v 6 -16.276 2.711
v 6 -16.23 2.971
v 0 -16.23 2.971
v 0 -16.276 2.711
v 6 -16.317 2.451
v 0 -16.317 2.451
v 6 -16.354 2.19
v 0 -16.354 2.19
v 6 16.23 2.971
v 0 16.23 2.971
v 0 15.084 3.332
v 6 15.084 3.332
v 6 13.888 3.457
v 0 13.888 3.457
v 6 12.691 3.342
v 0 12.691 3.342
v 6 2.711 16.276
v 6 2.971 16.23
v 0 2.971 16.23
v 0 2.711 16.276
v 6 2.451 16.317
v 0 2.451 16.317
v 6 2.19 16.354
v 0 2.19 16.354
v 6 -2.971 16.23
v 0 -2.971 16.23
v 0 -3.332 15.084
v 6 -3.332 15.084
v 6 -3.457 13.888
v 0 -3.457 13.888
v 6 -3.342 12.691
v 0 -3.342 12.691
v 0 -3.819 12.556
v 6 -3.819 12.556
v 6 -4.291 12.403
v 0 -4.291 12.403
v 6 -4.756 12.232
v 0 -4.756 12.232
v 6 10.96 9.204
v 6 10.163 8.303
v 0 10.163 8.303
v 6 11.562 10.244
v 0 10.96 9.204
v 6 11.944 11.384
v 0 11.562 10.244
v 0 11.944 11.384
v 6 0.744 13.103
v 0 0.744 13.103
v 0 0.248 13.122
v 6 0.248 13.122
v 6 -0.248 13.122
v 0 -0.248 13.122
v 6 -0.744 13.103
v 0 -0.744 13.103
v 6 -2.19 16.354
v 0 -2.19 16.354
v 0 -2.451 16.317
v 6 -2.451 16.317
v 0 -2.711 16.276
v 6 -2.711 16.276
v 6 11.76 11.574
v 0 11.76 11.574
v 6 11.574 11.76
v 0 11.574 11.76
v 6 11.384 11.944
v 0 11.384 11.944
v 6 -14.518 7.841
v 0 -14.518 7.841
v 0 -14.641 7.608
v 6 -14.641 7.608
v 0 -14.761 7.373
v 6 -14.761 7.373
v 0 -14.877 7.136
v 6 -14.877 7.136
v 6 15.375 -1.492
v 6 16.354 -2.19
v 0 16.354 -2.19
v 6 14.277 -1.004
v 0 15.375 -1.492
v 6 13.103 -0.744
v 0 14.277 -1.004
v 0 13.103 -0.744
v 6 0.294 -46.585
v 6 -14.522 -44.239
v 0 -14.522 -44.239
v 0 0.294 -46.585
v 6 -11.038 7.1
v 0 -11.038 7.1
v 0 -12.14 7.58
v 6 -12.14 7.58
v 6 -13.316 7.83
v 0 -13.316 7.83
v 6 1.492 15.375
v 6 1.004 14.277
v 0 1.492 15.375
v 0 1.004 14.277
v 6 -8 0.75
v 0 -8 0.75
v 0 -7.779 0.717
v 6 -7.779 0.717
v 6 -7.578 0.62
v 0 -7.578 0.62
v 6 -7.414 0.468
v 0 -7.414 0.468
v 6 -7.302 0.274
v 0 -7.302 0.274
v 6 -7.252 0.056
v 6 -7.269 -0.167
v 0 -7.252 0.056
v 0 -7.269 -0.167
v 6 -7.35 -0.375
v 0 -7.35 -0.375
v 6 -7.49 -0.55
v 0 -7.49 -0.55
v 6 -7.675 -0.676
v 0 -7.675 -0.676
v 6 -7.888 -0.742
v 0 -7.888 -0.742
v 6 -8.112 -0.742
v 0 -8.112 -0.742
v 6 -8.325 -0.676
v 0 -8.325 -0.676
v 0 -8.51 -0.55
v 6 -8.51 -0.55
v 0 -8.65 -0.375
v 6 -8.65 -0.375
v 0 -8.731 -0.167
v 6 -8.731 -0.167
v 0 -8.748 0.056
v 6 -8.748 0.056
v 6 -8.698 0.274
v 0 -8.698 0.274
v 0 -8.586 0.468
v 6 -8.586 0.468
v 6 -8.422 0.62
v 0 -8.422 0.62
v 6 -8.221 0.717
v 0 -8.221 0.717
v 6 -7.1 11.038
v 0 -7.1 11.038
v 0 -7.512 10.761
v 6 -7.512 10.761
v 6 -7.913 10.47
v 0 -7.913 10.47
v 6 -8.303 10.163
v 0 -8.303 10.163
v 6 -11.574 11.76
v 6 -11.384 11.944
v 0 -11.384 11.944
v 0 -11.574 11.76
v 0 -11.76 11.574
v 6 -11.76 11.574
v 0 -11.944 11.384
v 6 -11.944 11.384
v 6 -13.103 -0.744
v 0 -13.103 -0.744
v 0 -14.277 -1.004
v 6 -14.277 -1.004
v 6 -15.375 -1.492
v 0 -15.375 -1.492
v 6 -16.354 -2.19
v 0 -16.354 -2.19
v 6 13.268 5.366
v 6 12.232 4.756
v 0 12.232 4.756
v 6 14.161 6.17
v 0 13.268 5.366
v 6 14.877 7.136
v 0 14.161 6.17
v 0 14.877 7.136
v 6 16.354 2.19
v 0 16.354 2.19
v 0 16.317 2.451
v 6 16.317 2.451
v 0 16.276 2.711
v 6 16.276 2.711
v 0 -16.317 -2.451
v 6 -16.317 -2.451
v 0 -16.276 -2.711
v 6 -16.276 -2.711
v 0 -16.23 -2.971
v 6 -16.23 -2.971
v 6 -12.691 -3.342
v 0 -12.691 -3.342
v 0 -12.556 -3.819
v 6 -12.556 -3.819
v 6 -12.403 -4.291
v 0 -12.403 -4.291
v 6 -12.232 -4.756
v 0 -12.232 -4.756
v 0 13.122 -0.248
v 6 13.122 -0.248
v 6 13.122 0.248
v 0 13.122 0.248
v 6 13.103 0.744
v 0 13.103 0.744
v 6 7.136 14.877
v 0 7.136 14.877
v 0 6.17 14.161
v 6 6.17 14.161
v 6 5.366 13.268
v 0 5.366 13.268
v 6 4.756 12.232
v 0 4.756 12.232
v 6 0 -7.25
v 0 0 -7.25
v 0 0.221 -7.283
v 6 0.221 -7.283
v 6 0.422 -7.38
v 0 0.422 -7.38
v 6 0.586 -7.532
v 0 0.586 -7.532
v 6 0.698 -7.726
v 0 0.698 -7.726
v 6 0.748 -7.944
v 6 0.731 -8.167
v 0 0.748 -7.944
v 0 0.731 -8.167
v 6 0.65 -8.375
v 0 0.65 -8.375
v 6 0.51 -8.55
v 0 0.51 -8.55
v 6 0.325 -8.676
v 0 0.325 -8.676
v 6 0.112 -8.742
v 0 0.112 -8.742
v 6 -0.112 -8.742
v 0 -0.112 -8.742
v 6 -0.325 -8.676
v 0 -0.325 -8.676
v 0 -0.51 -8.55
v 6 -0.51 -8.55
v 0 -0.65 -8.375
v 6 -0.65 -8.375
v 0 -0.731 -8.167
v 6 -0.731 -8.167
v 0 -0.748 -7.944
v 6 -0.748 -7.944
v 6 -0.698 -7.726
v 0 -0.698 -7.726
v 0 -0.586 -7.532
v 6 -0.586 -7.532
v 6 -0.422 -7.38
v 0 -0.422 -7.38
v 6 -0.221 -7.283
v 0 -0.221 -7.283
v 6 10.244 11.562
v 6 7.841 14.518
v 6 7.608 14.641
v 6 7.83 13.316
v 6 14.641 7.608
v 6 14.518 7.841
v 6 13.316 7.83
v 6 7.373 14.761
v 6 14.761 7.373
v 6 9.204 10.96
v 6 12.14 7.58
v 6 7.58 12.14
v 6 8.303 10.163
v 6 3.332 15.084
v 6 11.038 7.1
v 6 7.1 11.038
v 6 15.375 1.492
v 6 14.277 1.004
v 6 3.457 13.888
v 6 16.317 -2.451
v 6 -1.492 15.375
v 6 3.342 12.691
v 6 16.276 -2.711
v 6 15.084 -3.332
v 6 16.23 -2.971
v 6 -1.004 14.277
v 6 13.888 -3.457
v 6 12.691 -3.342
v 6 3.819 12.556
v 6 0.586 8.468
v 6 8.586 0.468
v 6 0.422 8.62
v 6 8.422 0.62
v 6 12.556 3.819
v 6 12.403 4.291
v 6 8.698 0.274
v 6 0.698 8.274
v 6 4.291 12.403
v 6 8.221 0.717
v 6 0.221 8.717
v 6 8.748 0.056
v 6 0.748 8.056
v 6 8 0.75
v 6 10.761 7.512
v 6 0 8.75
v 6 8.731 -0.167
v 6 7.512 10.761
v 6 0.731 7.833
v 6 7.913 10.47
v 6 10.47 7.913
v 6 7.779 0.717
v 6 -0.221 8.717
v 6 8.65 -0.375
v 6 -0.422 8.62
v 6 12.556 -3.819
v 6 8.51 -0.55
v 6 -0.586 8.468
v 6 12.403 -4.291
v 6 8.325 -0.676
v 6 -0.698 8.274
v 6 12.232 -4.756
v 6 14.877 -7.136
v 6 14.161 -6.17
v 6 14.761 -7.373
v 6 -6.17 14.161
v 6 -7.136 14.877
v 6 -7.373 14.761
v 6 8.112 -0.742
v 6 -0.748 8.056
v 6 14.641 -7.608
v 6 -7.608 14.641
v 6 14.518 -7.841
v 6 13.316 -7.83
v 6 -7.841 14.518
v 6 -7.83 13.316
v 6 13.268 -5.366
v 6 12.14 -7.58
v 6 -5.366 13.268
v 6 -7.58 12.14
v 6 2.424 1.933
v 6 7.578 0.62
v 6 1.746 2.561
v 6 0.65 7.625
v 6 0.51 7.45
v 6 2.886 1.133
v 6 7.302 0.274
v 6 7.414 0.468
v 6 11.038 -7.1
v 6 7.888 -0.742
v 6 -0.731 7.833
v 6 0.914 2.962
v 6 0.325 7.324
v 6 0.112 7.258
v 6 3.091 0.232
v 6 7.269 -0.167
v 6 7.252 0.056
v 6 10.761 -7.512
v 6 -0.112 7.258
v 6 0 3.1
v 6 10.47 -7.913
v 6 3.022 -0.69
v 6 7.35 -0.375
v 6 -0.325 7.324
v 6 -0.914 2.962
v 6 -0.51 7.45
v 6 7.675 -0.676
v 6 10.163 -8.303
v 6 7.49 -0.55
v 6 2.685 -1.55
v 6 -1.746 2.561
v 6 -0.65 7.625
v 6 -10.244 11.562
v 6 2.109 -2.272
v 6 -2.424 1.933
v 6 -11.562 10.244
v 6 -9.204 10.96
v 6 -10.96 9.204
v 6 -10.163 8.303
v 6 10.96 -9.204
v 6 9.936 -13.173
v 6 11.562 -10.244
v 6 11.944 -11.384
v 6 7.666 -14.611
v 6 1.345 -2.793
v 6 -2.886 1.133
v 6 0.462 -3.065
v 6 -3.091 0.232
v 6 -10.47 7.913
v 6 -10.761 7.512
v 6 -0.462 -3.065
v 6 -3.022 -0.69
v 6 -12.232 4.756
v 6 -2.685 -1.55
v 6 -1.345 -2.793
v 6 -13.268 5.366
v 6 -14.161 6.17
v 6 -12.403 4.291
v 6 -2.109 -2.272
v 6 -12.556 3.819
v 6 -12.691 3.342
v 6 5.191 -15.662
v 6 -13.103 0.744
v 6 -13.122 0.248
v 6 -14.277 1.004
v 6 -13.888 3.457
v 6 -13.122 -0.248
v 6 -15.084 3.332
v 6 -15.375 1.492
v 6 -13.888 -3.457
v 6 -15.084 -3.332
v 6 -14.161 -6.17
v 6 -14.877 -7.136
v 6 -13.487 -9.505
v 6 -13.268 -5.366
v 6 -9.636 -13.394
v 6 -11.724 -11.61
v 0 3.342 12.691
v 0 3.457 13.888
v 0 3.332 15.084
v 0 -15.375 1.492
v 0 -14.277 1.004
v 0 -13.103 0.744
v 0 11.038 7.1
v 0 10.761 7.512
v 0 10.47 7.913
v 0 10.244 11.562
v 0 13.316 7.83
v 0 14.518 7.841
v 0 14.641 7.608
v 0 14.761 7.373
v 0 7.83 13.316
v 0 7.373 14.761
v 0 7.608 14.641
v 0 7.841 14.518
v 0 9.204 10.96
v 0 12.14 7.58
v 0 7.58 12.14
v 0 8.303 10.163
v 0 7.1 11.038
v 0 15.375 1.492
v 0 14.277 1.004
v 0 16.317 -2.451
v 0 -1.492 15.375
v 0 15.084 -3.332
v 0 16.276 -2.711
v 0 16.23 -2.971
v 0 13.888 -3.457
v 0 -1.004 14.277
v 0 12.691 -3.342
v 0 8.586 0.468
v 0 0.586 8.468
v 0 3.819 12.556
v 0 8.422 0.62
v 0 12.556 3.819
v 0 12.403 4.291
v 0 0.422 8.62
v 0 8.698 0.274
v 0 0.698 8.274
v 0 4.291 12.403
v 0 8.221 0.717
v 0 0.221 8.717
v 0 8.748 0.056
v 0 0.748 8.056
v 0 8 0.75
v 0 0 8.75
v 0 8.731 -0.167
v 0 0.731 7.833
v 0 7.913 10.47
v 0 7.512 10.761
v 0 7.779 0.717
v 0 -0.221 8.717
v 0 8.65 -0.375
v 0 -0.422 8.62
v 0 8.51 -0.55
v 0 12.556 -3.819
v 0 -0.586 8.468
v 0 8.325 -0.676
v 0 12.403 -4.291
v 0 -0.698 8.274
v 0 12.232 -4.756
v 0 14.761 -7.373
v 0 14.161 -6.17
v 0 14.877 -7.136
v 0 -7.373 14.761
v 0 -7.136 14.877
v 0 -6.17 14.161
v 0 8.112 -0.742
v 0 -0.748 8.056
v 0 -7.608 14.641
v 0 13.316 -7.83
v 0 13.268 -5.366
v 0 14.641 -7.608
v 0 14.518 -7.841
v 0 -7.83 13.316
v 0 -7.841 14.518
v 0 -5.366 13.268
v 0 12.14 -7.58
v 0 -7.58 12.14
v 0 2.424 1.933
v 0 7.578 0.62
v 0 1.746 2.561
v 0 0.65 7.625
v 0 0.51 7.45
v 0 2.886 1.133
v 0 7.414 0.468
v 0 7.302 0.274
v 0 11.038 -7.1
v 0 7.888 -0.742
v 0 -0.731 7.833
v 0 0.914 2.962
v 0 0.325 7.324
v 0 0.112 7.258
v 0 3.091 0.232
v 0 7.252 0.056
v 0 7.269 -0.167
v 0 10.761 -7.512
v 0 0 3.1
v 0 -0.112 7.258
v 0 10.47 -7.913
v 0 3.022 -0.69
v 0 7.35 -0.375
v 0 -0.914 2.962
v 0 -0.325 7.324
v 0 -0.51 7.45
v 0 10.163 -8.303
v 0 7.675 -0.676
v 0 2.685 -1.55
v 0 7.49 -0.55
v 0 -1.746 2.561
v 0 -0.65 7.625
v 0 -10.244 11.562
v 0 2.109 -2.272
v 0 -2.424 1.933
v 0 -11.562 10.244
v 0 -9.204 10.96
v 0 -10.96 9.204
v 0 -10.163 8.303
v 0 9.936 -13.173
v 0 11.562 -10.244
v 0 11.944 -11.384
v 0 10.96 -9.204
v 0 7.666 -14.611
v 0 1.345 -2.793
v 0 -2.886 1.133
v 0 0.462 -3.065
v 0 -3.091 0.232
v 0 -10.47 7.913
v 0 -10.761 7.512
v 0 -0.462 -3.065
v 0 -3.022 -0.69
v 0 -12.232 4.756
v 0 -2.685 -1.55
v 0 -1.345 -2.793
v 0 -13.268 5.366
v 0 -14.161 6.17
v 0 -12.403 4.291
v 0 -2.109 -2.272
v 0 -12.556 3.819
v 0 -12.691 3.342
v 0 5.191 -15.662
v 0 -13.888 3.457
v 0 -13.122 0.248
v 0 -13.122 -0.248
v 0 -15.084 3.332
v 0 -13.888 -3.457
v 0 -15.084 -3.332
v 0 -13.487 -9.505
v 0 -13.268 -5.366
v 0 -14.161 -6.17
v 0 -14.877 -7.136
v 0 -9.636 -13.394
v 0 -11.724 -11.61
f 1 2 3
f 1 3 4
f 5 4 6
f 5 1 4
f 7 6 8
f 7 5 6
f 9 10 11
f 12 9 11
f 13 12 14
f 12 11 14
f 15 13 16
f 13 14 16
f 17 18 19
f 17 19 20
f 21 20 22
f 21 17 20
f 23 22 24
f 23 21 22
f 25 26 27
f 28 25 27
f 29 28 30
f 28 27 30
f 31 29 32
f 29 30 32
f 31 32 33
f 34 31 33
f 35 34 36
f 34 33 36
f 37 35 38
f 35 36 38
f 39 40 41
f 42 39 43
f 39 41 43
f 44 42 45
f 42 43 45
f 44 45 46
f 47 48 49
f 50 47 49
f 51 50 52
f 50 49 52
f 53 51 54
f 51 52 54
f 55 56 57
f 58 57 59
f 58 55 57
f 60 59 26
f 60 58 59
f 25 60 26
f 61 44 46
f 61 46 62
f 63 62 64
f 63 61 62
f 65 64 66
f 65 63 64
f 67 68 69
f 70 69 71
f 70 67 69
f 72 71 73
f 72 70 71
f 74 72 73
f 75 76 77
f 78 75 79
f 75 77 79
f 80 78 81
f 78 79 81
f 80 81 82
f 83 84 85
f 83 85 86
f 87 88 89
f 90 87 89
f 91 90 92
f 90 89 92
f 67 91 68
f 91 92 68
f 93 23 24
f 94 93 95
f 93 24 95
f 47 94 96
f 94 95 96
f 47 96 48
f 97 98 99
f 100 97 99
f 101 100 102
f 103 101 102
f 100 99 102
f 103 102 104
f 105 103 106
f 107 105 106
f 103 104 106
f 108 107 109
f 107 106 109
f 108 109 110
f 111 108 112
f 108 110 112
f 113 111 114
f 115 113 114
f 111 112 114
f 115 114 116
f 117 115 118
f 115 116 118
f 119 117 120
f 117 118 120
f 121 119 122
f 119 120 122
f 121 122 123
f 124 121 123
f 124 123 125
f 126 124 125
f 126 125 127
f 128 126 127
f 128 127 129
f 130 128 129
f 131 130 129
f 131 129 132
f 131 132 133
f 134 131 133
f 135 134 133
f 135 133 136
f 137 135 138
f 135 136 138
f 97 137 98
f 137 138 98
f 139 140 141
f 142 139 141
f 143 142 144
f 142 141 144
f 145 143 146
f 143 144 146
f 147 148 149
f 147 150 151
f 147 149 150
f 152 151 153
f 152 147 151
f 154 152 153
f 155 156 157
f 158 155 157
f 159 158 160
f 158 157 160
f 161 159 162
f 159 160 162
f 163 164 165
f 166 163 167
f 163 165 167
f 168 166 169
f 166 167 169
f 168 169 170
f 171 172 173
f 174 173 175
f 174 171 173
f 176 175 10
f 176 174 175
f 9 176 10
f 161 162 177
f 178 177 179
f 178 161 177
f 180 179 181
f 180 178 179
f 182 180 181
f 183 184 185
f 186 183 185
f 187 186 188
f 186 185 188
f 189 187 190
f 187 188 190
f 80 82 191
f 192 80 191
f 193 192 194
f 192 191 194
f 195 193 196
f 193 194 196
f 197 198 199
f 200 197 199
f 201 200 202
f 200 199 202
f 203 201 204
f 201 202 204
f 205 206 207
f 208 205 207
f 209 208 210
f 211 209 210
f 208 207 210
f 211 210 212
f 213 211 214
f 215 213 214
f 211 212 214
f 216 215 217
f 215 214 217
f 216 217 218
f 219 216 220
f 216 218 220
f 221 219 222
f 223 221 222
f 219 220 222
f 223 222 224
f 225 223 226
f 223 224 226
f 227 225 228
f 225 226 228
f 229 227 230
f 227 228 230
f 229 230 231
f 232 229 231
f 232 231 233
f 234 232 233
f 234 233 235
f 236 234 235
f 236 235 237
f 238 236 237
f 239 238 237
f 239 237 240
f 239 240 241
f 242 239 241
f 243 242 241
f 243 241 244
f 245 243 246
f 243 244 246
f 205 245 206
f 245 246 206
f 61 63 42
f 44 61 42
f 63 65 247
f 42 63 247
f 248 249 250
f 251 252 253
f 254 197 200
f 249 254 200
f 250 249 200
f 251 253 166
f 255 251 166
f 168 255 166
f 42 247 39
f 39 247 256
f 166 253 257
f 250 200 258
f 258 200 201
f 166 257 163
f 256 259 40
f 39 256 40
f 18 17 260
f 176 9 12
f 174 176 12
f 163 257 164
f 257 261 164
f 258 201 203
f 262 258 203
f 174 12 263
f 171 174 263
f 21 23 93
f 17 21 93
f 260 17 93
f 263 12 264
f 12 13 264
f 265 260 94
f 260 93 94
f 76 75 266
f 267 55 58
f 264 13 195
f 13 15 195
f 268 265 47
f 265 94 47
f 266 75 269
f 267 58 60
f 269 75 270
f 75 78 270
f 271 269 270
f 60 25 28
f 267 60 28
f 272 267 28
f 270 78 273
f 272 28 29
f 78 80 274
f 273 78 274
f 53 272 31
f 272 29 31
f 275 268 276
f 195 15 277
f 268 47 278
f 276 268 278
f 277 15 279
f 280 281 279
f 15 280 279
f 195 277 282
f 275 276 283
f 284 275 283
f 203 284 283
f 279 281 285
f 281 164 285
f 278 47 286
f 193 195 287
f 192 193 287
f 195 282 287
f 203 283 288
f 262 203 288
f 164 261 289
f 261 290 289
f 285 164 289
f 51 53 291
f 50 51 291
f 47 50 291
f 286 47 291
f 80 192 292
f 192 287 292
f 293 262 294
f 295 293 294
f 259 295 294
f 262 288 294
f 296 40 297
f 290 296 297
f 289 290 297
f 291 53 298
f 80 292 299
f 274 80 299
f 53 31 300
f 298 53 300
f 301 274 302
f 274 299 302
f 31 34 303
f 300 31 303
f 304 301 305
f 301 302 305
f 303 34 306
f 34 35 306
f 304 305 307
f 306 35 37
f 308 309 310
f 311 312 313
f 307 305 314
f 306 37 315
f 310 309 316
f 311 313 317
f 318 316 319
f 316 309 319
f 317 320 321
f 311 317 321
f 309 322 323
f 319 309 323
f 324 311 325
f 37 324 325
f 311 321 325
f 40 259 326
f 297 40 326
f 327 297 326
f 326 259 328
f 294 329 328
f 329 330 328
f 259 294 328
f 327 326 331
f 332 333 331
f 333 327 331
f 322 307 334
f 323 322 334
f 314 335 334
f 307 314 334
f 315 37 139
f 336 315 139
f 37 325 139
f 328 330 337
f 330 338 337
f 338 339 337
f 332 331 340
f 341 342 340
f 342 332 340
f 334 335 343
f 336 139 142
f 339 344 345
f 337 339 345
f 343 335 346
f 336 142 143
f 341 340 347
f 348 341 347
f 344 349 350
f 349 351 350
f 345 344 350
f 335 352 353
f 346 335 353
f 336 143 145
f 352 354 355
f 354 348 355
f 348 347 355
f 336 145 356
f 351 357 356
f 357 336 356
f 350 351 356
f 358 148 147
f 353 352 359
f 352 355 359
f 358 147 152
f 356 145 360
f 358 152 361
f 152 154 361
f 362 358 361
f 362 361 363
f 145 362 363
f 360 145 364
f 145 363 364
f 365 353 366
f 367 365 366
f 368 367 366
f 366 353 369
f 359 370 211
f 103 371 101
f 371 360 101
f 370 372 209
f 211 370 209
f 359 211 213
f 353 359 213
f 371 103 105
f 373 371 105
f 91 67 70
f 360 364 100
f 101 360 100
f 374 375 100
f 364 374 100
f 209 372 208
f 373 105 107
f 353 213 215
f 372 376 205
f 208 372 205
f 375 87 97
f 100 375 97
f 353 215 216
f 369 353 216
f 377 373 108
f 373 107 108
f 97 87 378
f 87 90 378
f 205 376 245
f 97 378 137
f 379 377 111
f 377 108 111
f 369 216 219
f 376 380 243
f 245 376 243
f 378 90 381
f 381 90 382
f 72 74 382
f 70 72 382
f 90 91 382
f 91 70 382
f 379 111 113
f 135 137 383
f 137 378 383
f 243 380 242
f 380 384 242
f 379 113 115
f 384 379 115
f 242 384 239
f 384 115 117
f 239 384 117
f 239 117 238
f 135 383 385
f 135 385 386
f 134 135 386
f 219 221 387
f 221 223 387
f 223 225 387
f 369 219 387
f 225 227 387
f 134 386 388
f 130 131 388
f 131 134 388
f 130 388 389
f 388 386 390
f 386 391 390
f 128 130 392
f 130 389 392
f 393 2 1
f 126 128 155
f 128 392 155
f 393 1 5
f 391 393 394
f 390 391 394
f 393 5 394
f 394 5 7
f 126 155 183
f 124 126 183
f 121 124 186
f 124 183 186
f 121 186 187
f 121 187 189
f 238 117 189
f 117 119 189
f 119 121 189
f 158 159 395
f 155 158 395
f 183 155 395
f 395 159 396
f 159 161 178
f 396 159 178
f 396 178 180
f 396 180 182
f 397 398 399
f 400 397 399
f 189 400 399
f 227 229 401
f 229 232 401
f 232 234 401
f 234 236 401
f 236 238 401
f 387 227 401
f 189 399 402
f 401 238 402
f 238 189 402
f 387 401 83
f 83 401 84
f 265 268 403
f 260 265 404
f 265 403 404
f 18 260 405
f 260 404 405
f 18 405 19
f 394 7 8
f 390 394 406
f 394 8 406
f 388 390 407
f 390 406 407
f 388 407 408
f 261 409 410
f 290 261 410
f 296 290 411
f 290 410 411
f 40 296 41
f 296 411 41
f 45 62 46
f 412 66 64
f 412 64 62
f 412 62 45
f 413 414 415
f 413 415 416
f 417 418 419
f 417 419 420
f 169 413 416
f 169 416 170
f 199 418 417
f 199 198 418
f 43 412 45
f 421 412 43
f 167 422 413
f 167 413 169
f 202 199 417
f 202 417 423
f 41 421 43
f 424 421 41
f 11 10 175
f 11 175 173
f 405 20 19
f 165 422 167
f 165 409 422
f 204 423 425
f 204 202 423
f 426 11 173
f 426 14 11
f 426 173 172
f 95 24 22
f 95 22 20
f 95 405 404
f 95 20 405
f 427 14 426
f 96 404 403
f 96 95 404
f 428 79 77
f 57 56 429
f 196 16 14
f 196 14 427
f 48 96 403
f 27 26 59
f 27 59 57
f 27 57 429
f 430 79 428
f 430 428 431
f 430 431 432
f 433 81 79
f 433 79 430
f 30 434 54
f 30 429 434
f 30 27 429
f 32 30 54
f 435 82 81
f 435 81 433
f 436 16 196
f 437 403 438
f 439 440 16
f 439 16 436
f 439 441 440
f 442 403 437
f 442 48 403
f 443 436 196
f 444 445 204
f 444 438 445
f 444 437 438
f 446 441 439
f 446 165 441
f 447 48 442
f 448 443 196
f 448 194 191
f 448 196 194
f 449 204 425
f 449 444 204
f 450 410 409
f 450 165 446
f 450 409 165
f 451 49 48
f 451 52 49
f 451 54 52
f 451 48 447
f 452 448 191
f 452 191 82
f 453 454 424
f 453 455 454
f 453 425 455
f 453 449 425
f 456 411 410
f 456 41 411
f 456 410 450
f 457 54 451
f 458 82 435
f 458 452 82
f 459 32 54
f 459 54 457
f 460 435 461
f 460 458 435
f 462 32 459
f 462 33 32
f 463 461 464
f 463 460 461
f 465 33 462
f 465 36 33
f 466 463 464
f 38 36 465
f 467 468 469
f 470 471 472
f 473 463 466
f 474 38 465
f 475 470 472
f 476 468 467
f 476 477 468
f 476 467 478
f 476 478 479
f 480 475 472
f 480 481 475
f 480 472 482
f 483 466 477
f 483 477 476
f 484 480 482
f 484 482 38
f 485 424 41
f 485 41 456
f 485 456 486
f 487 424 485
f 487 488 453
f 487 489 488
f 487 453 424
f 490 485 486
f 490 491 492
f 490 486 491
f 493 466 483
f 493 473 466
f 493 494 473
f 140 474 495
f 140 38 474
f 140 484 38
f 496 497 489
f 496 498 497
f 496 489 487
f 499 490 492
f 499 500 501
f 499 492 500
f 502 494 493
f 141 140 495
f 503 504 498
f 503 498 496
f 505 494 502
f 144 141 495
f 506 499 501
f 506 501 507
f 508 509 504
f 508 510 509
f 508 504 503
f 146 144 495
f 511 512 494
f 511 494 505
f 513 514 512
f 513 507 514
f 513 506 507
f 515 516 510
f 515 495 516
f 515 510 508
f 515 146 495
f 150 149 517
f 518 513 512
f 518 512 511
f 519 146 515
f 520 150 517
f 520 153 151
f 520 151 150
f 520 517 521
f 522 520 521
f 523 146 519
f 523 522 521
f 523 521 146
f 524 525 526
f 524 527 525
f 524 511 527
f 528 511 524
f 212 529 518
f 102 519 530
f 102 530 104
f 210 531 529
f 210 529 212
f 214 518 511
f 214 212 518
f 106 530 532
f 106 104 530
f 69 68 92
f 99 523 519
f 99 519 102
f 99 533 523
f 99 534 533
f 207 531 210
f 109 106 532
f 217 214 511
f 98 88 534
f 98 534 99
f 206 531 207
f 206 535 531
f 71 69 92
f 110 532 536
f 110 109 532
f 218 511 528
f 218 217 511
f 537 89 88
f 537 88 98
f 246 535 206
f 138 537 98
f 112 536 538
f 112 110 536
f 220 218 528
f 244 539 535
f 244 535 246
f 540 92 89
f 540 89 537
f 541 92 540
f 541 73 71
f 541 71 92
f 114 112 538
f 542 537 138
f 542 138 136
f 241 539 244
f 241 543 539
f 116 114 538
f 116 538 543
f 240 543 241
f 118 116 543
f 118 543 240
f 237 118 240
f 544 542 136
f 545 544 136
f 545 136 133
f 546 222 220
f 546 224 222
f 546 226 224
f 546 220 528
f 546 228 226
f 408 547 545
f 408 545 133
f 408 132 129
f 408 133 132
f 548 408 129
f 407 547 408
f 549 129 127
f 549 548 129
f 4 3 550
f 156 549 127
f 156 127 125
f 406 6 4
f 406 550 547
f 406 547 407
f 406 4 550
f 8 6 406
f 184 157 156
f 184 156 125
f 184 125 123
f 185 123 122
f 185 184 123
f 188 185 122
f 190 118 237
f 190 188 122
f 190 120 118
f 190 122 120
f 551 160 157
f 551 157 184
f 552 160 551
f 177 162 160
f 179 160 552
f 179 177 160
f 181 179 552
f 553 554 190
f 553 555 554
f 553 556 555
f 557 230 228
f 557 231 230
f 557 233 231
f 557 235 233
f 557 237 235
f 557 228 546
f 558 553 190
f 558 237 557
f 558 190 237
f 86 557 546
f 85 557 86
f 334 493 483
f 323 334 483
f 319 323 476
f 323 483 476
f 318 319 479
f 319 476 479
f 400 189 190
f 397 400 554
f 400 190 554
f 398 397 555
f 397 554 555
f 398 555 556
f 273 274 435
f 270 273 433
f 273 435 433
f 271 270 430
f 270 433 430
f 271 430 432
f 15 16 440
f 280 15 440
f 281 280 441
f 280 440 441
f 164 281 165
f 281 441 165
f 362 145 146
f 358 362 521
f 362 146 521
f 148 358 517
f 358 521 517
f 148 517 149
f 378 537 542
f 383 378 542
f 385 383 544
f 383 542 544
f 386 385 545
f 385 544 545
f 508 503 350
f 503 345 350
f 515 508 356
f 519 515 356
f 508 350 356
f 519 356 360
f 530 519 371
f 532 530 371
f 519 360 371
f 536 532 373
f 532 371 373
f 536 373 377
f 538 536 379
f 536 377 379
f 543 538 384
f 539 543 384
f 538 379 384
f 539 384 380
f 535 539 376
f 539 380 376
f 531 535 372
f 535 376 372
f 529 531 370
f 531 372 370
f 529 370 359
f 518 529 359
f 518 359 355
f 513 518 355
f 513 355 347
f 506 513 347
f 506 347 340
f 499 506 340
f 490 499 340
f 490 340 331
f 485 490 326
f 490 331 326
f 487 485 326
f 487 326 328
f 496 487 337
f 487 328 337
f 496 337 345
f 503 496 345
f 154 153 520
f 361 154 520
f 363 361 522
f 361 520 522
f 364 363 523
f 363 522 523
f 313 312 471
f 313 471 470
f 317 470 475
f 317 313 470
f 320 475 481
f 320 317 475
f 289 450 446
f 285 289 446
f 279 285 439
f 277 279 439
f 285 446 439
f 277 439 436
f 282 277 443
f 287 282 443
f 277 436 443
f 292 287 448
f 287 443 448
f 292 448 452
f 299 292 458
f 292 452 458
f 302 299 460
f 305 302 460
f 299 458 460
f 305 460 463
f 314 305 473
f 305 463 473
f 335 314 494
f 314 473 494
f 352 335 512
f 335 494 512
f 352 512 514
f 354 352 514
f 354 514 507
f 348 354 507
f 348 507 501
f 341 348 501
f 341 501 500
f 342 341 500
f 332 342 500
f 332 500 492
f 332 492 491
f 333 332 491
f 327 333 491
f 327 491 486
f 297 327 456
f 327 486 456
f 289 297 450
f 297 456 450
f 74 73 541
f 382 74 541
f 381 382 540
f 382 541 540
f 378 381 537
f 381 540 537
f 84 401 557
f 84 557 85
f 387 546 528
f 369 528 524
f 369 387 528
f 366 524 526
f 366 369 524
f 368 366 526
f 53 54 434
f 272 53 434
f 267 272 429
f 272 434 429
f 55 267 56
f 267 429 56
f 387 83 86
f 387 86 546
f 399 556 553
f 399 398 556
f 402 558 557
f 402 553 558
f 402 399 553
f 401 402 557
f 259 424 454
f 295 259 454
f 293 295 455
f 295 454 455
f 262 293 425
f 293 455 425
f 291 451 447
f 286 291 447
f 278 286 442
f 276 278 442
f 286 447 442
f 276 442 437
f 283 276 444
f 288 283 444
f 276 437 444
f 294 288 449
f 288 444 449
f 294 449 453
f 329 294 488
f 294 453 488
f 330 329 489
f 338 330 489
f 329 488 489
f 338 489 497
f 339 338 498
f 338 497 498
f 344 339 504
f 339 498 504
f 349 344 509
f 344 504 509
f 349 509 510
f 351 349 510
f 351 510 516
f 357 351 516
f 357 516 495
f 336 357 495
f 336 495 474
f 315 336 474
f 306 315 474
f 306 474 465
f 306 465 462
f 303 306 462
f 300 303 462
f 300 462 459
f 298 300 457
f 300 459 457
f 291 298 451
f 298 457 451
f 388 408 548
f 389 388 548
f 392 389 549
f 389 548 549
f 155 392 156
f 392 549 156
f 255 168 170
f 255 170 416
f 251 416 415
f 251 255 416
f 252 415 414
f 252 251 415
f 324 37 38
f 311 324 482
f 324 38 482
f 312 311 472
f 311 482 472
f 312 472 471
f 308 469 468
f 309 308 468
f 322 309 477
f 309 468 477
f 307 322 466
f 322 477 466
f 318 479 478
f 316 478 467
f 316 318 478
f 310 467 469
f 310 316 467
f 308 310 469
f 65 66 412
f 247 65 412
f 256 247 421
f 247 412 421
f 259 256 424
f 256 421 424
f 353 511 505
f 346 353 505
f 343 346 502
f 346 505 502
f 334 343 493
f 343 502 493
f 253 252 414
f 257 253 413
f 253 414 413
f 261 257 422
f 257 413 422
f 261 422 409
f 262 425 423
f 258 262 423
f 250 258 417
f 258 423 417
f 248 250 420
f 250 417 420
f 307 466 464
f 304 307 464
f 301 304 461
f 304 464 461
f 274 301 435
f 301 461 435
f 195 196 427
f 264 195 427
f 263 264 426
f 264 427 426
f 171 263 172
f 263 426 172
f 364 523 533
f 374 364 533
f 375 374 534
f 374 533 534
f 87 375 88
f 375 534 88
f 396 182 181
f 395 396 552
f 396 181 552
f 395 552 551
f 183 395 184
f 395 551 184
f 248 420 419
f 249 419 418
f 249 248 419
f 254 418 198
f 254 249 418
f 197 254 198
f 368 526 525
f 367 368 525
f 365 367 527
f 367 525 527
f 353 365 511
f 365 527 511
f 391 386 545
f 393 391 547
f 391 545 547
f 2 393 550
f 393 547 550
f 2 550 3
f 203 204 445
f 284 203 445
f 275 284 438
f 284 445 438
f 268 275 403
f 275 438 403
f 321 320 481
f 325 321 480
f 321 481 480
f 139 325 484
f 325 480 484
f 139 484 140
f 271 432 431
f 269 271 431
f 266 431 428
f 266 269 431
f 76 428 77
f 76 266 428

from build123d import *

# Parameters (mm, degrees)
BASPROSKE_W             = 6
BASPROSKE_H             = 16.5
TOOTHCUT_DEPTH          = 25.093567606
TEETHCUTS_COUNT         = 20
TEETHCUTS_ANGLE         = 342
BORSKE_R                = 3.1
BORE_DEPTH              = 50.0000508
BOSS_EXTRU_1_DEPTH      = 6
ESQUISSE3_R             = 0.75
ENL_V_MAT_EXTRU_1_DEPTH = 6


with BuildPart() as part:
    # BasProSke → Base-Revolve (revolve)
    with BuildSketch(Plane(origin=(0, 0, 0), x_dir=(1, 0, 0), z_dir=(0, 1, 0)), mode=Mode.PRIVATE) as base_revolve_sk:
        with Locations((3, 8.25)):
            Rectangle(BASPROSKE_W, BASPROSKE_H)
    revolve(base_revolve_sk.sketch.rotate(Axis((-10, 0, 0), (1, 0, 0)), 180), axis=Axis((-10, 0, 0), (1, 0, 0)))

    # TooCutSke → ToothCut (cut, through all)
    with BuildSketch(Plane(origin=(0, 0, 0), x_dir=(0, 0, -1), z_dir=(1, 0, 0))):
        with BuildLine():
            ThreePointArc((0.74381438, 13.102904875), (0, 13.124), (-0.74381438, 13.102904875))
            ThreePointArc((-0.74381438, 13.102904875), (-1.226473103, 14.852072512), (-2.209965745, 16.376962373))
            ThreePointArc((-2.209965745, 16.376962373), (0, 16.5254), (2.209965745, 16.376962373))
            ThreePointArc((2.209965745, 16.376962373), (1.226473103, 14.852072512), (0.74381438, 13.102904875))
        make_face()
    toothcut = extrude(amount=TOOTHCUT_DEPTH, mode=Mode.SUBTRACT)

    # TeethCuts: ToothCut ×20 about axis, 6 skipped
    teethcuts_axis = Axis((-10, 0, 0), (1, 0, 0))
    add([toothcut.rotate(teethcuts_axis, i * TEETHCUTS_ANGLE / (TEETHCUTS_COUNT - 1)) for i in range(1, TEETHCUTS_COUNT) if i not in (12, 13, 14, 15, 16, 17)], mode=Mode.SUBTRACT)

    # BorSke → Bore (cut, symmetric)
    with BuildSketch(Plane(origin=(0, 0, 0), x_dir=(0, 0, -1), z_dir=(1, 0, 0))):
        with Locations(Location((0, 0, 0), (0, 0, 180))):
            Circle(BORSKE_R)
    extrude(amount=BORE_DEPTH, both=True, mode=Mode.SUBTRACT)

    # Esquisse2 → Boss.-Extru.1 (add)
    with BuildSketch(Plane(origin=(6, 0, 0), x_dir=(0, 0, -1), z_dir=(1, 0, 0))):
        Polygon((10.44563255, 6.017449598), (8.099115574, -8.797875511), (44.238631957, -14.521812587), (46.585148932, 0.293512522), align=None)
    extrude(amount=-BOSS_EXTRU_1_DEPTH)

    # Esquisse3 → Enlèv. mat.-Extru.1 (cut)
    with BuildSketch(Plane.ZY):
        with Locations((8, 0)):
            Circle(ESQUISSE3_R)
        with Locations((-8, 0)):
            Circle(ESQUISSE3_R)
        with Locations((0, 8)):
            Circle(ESQUISSE3_R)
        with Locations((0, -8)):
            Circle(ESQUISSE3_R)
    extrude(amount=-ENL_V_MAT_EXTRU_1_DEPTH, mode=Mode.SUBTRACT)


solid = part.part
